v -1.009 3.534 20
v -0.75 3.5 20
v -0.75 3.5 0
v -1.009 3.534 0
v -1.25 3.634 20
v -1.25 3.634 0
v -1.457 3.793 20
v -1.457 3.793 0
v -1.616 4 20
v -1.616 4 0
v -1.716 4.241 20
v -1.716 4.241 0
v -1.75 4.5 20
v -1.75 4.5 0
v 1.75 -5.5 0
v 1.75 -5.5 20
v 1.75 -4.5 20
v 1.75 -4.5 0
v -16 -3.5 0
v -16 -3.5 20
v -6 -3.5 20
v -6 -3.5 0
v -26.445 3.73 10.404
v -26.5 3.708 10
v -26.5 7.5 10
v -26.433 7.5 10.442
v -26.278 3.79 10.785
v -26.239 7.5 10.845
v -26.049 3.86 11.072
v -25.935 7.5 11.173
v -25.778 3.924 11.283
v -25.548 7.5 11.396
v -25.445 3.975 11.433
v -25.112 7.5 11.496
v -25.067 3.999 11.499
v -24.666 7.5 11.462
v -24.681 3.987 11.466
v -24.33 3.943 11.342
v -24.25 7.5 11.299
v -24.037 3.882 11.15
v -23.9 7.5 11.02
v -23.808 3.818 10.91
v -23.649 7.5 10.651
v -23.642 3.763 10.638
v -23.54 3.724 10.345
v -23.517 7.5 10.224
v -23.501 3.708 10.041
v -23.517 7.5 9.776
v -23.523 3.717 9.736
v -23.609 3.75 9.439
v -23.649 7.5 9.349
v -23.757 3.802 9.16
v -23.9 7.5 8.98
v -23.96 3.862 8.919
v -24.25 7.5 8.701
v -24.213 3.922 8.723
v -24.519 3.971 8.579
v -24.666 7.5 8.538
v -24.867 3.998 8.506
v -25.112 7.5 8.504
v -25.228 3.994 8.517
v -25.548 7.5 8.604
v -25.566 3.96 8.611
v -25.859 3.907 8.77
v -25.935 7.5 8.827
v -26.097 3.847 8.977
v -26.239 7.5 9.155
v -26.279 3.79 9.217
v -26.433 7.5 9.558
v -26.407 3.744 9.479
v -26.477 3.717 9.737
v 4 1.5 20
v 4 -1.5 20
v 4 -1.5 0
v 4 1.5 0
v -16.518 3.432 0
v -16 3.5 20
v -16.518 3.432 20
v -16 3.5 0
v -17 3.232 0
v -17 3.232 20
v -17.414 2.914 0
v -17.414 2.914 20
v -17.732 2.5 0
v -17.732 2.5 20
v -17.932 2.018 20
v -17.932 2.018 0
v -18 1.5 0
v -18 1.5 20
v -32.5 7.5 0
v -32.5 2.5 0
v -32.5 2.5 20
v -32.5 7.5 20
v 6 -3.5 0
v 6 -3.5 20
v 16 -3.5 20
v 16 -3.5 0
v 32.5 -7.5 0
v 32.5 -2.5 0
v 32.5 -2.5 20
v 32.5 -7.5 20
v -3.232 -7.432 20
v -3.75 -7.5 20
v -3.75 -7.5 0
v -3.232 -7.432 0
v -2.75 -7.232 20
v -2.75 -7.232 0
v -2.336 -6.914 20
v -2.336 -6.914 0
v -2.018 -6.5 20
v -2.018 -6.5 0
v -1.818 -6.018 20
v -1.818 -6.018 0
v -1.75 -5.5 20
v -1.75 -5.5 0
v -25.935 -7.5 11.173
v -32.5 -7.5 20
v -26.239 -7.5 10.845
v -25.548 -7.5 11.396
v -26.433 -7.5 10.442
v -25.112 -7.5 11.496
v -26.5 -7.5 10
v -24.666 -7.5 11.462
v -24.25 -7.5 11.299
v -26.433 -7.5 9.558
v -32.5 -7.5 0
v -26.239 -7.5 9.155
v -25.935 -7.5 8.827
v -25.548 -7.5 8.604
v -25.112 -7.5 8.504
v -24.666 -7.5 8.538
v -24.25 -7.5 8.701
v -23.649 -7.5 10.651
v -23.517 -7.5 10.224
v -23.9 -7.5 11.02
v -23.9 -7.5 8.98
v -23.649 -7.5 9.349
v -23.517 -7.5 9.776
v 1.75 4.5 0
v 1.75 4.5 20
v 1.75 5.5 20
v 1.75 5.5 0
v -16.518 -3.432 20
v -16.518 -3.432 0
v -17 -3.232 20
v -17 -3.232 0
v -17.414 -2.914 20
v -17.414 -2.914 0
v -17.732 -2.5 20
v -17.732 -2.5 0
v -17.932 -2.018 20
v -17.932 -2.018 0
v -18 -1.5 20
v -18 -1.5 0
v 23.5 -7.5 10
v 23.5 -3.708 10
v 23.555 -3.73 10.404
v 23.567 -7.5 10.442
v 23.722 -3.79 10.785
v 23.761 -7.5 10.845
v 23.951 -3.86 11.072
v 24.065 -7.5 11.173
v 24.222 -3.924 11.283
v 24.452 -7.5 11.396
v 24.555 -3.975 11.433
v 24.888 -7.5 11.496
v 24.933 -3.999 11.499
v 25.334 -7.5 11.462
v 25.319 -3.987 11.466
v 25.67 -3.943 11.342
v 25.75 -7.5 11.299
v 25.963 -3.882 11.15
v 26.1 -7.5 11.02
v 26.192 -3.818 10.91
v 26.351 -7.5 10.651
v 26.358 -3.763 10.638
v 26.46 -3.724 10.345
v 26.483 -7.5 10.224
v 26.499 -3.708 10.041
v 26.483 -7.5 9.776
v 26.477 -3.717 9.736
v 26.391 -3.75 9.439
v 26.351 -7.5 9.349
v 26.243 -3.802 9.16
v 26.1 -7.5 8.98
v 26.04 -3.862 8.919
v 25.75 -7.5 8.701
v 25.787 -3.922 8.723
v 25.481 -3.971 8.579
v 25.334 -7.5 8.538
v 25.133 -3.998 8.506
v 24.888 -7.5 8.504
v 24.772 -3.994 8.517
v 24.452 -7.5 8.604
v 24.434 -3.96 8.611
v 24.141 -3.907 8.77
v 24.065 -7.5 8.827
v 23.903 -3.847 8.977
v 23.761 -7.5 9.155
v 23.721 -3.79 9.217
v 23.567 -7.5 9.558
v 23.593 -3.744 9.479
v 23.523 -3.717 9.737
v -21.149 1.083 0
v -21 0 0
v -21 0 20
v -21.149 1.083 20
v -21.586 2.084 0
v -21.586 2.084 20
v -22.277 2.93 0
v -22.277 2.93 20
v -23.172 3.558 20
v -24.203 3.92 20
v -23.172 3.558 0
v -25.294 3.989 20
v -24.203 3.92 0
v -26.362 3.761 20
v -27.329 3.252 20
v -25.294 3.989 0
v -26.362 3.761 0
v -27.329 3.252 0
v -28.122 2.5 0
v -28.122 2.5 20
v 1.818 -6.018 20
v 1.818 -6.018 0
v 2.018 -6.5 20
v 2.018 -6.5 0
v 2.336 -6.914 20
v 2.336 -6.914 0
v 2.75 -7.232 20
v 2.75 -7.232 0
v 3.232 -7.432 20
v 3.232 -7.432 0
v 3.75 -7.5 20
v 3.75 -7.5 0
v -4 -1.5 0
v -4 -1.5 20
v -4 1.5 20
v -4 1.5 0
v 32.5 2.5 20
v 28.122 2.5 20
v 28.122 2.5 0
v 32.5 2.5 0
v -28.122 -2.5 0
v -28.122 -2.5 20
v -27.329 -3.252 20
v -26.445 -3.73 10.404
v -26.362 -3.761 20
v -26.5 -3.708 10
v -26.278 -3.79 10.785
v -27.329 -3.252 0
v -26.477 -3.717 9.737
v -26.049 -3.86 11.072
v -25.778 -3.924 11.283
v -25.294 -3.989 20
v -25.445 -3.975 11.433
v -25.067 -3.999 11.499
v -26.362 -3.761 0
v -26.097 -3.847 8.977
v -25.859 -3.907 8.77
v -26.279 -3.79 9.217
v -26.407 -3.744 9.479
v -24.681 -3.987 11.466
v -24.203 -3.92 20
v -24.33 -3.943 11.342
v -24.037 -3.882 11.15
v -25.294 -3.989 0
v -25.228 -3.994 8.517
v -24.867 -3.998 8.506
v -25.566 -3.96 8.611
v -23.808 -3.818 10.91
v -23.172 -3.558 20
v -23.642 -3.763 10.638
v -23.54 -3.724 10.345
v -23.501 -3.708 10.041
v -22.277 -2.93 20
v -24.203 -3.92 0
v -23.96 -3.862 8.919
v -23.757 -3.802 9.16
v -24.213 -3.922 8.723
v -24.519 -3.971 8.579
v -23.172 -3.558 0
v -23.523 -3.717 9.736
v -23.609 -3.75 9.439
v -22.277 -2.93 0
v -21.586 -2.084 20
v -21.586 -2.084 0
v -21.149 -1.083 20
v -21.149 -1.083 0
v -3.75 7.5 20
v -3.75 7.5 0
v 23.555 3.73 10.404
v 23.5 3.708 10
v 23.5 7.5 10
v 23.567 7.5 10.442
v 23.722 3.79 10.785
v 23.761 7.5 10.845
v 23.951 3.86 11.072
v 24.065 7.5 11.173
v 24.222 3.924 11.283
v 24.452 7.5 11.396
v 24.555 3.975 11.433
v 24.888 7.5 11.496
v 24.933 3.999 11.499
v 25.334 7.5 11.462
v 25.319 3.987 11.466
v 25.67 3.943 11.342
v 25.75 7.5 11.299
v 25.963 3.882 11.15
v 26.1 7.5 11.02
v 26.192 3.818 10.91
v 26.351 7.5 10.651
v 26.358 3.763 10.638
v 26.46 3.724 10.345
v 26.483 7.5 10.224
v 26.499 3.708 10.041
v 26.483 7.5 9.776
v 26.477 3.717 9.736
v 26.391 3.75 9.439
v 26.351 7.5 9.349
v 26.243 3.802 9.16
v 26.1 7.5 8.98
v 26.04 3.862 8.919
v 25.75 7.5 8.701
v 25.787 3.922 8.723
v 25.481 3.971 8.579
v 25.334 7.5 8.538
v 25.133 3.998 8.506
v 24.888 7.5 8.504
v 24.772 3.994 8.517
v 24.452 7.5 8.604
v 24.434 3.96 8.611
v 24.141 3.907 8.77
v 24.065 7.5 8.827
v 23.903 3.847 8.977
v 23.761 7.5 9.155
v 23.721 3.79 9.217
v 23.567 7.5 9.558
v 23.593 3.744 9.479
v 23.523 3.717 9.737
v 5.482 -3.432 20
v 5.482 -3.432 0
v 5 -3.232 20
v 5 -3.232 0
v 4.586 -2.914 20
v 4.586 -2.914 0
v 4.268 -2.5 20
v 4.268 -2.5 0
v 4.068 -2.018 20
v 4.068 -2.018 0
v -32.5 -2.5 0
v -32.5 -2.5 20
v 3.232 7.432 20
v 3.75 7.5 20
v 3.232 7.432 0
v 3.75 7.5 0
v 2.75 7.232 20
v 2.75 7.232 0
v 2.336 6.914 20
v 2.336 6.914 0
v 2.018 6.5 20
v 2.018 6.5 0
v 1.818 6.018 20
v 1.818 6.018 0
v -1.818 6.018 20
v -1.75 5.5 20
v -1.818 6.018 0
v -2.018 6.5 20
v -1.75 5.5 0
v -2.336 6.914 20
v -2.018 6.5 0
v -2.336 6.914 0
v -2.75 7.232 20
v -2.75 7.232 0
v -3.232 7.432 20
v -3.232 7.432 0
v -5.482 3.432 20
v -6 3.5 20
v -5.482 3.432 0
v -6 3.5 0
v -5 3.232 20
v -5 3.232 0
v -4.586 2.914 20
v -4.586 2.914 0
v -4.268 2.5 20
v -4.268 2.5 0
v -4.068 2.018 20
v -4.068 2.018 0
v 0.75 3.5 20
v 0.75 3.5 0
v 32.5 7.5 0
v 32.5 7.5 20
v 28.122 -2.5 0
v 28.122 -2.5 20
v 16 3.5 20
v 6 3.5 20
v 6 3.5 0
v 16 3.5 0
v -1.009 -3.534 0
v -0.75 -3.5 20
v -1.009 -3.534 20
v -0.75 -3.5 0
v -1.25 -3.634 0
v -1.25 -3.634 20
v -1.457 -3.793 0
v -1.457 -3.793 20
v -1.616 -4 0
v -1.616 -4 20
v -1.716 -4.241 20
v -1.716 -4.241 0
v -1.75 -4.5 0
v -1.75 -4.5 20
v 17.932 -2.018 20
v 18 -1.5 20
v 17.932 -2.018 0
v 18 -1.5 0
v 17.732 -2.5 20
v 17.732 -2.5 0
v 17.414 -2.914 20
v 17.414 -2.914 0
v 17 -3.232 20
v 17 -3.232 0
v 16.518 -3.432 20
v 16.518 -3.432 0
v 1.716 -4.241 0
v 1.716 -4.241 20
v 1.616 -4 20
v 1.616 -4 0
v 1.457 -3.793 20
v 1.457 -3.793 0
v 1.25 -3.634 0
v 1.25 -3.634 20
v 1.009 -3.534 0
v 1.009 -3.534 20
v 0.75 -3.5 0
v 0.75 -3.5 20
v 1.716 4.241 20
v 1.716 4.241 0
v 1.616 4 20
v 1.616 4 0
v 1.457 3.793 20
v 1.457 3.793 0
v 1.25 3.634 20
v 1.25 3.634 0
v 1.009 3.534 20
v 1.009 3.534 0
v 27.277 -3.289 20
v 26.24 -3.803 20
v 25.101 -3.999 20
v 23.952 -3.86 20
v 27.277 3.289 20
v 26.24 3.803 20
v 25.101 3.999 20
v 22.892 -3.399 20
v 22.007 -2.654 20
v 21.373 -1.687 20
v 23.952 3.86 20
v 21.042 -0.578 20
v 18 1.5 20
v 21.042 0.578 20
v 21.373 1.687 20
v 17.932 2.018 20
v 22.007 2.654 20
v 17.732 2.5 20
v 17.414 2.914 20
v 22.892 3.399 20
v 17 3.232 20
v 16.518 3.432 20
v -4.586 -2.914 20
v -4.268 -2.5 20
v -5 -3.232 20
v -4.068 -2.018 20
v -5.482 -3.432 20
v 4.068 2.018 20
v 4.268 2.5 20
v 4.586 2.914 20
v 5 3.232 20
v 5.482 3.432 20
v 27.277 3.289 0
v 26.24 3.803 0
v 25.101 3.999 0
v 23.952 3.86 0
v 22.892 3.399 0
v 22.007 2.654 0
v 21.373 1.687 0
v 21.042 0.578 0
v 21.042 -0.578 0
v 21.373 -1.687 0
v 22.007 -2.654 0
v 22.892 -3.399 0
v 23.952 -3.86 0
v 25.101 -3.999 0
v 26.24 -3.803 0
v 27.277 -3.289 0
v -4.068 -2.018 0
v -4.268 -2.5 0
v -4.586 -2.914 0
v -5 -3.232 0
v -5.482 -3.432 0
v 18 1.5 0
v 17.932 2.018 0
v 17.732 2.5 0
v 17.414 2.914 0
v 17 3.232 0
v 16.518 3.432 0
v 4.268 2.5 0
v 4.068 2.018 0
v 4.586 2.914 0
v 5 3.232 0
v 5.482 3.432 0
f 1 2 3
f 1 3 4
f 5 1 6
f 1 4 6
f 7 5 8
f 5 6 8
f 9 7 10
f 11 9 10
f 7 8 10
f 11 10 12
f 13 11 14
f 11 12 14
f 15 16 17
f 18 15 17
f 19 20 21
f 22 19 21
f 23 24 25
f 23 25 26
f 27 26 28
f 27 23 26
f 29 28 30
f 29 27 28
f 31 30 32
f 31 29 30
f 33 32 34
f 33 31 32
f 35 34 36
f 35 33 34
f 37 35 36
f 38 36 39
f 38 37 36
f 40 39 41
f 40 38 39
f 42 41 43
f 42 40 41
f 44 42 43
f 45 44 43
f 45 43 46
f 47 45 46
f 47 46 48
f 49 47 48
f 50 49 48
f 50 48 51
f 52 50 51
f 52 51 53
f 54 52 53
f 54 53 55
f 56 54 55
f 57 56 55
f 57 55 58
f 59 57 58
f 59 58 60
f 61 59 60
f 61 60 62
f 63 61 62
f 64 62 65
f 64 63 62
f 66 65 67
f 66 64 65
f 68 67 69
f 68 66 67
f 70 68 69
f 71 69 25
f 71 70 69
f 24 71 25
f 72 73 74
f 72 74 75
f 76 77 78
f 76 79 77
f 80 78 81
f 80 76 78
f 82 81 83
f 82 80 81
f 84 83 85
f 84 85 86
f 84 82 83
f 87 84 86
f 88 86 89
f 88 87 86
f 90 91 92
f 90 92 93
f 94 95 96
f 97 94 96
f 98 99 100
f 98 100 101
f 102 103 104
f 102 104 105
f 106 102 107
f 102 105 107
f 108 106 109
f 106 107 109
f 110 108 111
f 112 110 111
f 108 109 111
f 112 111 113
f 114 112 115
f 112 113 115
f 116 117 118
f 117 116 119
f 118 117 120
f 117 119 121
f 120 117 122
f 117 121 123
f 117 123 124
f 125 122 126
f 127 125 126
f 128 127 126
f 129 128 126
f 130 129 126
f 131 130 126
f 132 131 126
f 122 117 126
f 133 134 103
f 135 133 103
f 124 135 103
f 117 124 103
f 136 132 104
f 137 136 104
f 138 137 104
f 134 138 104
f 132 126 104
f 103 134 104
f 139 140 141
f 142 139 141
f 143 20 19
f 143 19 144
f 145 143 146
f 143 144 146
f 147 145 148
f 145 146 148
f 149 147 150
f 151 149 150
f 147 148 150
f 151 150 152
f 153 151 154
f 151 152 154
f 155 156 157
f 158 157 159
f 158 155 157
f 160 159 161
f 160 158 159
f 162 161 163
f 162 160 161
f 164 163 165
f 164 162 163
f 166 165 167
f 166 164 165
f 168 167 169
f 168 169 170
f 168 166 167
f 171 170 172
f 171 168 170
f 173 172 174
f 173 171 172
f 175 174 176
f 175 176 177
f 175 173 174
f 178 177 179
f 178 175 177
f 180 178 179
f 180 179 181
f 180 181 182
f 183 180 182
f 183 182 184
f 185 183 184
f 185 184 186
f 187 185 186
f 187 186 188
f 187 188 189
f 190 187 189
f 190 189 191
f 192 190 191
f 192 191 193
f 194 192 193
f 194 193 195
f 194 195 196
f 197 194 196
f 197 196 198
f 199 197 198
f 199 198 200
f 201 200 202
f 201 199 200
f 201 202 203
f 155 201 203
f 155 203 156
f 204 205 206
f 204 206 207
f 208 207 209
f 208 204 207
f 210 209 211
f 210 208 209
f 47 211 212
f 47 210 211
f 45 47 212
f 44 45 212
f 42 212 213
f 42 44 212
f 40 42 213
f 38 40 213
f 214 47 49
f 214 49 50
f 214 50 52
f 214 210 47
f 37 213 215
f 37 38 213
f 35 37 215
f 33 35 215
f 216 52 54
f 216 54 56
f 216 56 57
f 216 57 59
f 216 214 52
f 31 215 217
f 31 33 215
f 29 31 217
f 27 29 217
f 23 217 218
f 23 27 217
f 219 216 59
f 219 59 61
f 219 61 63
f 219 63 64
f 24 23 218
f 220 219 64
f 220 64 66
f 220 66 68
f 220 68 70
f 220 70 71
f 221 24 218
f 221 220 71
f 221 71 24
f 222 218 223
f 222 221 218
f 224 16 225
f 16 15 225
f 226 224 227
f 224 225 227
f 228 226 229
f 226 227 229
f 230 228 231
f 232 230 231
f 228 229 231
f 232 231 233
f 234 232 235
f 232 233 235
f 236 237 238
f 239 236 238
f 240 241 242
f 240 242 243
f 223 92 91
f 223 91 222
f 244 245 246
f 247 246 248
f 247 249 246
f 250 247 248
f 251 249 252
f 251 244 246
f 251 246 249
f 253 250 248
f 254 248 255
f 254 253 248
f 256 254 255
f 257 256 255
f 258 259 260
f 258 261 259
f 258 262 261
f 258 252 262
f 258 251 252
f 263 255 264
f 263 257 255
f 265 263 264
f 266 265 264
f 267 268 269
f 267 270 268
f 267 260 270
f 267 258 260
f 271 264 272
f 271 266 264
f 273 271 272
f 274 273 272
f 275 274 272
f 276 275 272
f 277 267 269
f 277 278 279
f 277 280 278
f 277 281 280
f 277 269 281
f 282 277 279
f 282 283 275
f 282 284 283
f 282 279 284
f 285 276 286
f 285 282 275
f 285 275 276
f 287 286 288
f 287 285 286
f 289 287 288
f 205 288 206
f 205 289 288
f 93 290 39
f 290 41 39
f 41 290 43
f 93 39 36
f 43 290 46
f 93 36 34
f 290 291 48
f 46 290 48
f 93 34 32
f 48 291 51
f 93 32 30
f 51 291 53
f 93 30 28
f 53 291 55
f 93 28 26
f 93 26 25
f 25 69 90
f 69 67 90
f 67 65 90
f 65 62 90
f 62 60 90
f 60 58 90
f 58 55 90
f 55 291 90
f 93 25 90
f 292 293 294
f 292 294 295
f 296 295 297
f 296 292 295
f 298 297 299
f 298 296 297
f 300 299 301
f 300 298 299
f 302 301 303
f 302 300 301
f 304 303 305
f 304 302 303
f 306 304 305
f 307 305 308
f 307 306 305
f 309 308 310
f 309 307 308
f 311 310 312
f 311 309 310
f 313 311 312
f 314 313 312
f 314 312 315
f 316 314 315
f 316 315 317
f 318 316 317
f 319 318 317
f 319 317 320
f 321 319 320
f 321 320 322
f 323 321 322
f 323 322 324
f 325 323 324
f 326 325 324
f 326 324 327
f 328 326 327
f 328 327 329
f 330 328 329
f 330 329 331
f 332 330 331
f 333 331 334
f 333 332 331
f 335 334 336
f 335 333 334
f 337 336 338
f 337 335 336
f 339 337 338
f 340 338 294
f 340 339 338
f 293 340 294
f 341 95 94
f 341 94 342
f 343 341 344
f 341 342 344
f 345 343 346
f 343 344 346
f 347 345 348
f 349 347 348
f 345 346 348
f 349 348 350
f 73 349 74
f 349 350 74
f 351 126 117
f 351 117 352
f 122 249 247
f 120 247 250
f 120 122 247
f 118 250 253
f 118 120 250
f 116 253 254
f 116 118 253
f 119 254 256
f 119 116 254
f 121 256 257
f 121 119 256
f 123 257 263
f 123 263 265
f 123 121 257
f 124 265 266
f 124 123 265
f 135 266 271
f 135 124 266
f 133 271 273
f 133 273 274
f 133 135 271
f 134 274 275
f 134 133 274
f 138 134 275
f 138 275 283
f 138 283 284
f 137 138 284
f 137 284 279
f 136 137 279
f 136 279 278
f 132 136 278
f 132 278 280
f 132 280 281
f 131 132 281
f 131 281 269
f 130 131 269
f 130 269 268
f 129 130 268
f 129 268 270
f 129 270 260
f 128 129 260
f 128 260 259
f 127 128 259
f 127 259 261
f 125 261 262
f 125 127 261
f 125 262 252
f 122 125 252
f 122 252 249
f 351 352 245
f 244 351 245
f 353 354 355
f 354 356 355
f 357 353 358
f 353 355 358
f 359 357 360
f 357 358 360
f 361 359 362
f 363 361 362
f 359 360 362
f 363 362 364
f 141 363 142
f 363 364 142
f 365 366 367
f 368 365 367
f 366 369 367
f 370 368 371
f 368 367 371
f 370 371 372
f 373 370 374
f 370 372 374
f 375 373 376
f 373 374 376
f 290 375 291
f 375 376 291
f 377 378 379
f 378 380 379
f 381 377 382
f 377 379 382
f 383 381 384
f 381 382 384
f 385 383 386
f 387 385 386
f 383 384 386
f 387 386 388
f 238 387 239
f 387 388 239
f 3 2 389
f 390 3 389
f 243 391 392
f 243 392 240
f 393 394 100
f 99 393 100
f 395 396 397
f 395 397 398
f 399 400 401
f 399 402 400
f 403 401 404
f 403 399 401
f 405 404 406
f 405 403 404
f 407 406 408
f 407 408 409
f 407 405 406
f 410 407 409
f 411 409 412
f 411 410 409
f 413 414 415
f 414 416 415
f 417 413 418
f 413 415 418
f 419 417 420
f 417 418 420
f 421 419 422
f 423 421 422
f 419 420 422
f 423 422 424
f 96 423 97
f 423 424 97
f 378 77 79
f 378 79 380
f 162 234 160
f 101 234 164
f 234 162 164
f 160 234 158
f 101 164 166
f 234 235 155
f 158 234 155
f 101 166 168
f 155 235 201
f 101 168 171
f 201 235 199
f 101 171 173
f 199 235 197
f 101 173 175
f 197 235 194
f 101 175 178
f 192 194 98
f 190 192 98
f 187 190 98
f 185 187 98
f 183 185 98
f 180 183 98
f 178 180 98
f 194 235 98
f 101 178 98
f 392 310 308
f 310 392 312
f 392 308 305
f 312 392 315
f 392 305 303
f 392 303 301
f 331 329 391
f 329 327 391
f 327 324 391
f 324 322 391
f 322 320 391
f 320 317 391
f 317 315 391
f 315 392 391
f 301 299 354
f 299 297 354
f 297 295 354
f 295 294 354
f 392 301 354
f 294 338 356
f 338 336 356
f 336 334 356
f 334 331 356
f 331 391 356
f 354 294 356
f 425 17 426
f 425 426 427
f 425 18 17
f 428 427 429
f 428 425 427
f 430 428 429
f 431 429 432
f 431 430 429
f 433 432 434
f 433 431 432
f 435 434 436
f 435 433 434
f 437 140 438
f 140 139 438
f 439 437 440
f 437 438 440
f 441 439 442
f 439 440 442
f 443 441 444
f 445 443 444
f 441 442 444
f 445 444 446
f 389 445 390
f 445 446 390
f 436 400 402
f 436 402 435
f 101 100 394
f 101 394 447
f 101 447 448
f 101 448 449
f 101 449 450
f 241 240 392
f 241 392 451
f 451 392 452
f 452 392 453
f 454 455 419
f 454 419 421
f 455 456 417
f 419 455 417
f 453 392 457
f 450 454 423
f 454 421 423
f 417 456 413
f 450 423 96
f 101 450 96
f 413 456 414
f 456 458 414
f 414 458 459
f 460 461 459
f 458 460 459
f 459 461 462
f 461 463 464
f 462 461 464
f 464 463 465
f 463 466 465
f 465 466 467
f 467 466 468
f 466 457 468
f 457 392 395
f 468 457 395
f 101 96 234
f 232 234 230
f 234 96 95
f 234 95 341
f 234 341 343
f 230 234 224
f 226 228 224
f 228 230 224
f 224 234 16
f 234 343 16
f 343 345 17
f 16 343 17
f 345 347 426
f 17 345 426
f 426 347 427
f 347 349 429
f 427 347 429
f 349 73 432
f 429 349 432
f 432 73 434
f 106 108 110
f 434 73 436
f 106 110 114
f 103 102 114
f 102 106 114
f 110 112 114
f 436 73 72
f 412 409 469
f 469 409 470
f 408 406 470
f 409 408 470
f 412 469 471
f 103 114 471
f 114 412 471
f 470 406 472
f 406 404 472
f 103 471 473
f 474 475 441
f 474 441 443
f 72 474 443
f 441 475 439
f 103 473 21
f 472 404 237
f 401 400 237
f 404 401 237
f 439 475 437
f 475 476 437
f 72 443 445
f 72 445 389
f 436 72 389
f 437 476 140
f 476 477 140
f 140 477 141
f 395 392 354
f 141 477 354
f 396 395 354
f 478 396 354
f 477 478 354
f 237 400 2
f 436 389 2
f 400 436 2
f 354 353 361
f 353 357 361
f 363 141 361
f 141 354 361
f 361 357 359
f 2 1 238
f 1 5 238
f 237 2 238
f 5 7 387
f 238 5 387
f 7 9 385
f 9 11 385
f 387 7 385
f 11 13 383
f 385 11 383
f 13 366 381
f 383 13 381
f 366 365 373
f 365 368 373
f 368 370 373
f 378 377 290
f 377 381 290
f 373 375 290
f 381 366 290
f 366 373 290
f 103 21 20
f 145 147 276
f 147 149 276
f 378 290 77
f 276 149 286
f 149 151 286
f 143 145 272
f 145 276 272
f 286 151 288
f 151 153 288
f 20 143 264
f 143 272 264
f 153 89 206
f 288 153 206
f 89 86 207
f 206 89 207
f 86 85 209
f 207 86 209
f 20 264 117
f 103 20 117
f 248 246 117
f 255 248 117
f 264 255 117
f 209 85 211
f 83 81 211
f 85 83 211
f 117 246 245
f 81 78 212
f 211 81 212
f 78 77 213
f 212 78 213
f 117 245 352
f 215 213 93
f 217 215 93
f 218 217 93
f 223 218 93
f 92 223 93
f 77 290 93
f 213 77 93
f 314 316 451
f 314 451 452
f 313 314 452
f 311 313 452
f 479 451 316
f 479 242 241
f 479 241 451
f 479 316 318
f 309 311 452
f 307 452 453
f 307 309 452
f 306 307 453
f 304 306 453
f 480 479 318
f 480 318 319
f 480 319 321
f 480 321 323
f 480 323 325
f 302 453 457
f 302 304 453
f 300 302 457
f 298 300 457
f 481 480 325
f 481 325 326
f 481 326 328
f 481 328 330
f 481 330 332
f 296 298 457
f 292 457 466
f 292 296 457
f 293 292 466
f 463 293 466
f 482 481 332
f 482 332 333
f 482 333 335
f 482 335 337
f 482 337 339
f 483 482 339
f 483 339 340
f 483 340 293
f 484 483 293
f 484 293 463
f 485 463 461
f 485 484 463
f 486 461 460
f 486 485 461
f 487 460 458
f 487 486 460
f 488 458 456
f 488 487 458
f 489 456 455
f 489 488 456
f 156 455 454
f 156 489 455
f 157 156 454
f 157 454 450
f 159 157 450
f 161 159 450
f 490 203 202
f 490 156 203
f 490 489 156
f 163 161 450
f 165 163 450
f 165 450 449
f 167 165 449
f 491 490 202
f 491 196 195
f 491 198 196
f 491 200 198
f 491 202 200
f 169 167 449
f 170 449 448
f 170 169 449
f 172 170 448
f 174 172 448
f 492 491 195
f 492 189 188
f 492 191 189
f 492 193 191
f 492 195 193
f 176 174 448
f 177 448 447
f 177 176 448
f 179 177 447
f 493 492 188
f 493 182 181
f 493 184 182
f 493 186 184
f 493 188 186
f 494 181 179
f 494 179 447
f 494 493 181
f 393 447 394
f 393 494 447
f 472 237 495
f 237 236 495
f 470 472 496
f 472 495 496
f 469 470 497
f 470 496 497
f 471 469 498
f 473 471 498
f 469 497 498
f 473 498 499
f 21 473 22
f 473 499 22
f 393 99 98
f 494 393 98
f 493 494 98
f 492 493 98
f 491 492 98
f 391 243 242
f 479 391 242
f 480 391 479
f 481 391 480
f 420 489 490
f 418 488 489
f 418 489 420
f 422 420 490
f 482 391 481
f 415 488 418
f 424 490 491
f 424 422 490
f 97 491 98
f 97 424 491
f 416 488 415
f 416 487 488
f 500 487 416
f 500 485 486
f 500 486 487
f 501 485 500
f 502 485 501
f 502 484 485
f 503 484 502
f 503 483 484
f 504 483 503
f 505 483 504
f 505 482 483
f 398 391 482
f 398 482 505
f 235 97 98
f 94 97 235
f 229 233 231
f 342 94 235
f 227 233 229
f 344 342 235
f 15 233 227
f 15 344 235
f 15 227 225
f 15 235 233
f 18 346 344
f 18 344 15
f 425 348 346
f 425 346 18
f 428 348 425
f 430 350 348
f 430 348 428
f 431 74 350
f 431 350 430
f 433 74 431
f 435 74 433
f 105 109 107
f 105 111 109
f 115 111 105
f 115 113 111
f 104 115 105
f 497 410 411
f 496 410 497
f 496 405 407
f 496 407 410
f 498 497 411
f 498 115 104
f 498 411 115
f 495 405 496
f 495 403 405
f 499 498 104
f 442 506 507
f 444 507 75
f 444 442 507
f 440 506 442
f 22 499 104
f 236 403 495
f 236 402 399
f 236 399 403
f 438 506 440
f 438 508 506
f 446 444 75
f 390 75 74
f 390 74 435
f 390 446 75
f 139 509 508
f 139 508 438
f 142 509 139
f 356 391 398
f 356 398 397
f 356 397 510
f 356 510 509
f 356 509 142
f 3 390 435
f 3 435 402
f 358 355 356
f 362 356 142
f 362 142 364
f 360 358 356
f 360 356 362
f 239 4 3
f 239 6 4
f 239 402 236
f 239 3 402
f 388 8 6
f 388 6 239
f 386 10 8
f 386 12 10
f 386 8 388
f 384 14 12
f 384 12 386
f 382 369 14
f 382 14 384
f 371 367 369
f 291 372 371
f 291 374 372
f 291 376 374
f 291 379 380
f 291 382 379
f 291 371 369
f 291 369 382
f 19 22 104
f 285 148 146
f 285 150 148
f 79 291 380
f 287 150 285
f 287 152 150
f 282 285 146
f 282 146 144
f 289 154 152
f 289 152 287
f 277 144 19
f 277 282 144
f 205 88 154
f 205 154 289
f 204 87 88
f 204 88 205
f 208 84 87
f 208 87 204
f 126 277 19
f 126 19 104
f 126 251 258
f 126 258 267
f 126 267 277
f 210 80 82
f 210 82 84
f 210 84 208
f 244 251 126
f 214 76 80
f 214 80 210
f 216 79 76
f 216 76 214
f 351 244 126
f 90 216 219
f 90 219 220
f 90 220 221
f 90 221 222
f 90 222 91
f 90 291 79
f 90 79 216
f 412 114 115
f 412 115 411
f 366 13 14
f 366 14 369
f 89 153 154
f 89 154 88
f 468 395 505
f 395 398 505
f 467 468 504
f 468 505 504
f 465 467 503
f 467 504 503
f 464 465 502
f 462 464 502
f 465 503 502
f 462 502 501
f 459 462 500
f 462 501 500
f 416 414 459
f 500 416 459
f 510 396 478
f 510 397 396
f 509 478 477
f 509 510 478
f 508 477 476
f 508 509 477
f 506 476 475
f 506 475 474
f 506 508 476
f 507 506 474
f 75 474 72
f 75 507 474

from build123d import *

# Parameters (mm, degrees)
SKETCH_1_R               = 4
EXTRUDE_1_DEPTH          = 20
SKETCH_2_W               = 14
SKETCH_2_H               = 7
SKETCH_2_W_2             = 3.5
SKETCH_2_H_2             = 4
CUT_EXTRUDE_1_DEPTH      = 39.890872965
FILLET_1_R               = 2
FILLET_2_R               = 2
FILLET_4_R               = 1
CUT_EXTRUDE_2_DEPTH      = 42.003048667
CUT_EXTRUDE_2_DEPTH_BACK = 42.003048667
SKETCH_4_R               = 1.5
SKETCH_5_W               = 4.377501001
SKETCH_5_H               = 5
CUT_EXTRUDE_3_DEPTH      = 39.890873036


with BuildPart() as part:
    # 草图1 → 凸台-拉伸1 (new body)
    with BuildSketch(Plane.XY):
        Polygon((-25, 7.5), (25, 7.5), (32.5, 7.5), (32.5, -7.5), (25, -7.5), (-25, -7.5), (-32.5, -7.5), (-32.5, 7.5), align=None)
        with Locations((-25, 0)):
            Circle(SKETCH_1_R, mode=Mode.SUBTRACT)
        with Locations((25, 0)):
            Circle(SKETCH_1_R, mode=Mode.SUBTRACT)
    extrude(amount=EXTRUDE_1_DEPTH)

    # 草图2 → 切除-拉伸1 (cut, through all)
    with BuildSketch(Plane.XY.offset(20)):
        with Locations((-11, 0)):
            Rectangle(SKETCH_2_W, SKETCH_2_H)
        with Locations((11, 0)):
            Rectangle(SKETCH_2_W, SKETCH_2_H)
        with Locations((0, 5.5)):
            Rectangle(SKETCH_2_W_2, SKETCH_2_H_2)
        with Locations((0, -5.5)):
            Rectangle(SKETCH_2_W_2, SKETCH_2_H_2)
    extrude(amount=-CUT_EXTRUDE_1_DEPTH, mode=Mode.SUBTRACT)

    # 圆角1
    fillet_1_edges = [part.edges().sort_by_distance(p)[0] for p in [
        (-1.75, 7.5, 10),
        (1.75, 7.5, 10),
        (-1.75, -7.5, 10),
        (1.75, -7.5, 10),
    ]]
    fillet(fillet_1_edges, radius=FILLET_1_R)

    # 圆角2
    fillet_2_edges = [part.edges().sort_by_distance(p)[0] for p in [
        (-4, 3.5, 10),
        (-4, -3.5, 10),
        (-18, -3.5, 10),
        (-18, 3.5, 10),
        (18, 3.5, 10),
        (18, -3.5, 10),
        (4, -3.5, 10),
        (4, 3.5, 10),
    ]]
    fillet(fillet_2_edges, radius=FILLET_2_R)

    # 圆角4
    fillet_4_edges = [part.edges().sort_by_distance(p)[0] for p in [
        (-1.75, 3.5, 10),
        (1.75, 3.5, 10),
        (-1.75, -3.5, 10),
        (1.75, -3.5, 10),
    ]]
    fillet(fillet_4_edges, radius=FILLET_4_R)

    # 草图4 → 切除-拉伸2 (cut, two sides: drawn at the far end of the back side and taken through both)
    with BuildSketch(Plane(origin=(0, 7.5, 0), x_dir=(1, 0, 0), z_dir=(0, 1, 0)).offset(-CUT_EXTRUDE_2_DEPTH_BACK)):
        with Locations(Location((-25, -10, 0), (0, 0, 180))):
            Circle(SKETCH_4_R)
        with Locations(Location((25, -10, 0), (0, 0, 180))):
            Circle(SKETCH_4_R)
    extrude(amount=CUT_EXTRUDE_2_DEPTH + CUT_EXTRUDE_2_DEPTH_BACK, mode=Mode.SUBTRACT)

    # 草图5 → 切除-拉伸3 (cut, through all)
    with BuildSketch(Plane.XY.offset(20)):
        with Locations((-30.3112495, 0)):
            Rectangle(SKETCH_5_W, SKETCH_5_H)
        with Locations((30.3112495, 0)):
            Rectangle(SKETCH_5_W, SKETCH_5_H)
    extrude(amount=-CUT_EXTRUDE_3_DEPTH, mode=Mode.SUBTRACT)


solid = part.part
